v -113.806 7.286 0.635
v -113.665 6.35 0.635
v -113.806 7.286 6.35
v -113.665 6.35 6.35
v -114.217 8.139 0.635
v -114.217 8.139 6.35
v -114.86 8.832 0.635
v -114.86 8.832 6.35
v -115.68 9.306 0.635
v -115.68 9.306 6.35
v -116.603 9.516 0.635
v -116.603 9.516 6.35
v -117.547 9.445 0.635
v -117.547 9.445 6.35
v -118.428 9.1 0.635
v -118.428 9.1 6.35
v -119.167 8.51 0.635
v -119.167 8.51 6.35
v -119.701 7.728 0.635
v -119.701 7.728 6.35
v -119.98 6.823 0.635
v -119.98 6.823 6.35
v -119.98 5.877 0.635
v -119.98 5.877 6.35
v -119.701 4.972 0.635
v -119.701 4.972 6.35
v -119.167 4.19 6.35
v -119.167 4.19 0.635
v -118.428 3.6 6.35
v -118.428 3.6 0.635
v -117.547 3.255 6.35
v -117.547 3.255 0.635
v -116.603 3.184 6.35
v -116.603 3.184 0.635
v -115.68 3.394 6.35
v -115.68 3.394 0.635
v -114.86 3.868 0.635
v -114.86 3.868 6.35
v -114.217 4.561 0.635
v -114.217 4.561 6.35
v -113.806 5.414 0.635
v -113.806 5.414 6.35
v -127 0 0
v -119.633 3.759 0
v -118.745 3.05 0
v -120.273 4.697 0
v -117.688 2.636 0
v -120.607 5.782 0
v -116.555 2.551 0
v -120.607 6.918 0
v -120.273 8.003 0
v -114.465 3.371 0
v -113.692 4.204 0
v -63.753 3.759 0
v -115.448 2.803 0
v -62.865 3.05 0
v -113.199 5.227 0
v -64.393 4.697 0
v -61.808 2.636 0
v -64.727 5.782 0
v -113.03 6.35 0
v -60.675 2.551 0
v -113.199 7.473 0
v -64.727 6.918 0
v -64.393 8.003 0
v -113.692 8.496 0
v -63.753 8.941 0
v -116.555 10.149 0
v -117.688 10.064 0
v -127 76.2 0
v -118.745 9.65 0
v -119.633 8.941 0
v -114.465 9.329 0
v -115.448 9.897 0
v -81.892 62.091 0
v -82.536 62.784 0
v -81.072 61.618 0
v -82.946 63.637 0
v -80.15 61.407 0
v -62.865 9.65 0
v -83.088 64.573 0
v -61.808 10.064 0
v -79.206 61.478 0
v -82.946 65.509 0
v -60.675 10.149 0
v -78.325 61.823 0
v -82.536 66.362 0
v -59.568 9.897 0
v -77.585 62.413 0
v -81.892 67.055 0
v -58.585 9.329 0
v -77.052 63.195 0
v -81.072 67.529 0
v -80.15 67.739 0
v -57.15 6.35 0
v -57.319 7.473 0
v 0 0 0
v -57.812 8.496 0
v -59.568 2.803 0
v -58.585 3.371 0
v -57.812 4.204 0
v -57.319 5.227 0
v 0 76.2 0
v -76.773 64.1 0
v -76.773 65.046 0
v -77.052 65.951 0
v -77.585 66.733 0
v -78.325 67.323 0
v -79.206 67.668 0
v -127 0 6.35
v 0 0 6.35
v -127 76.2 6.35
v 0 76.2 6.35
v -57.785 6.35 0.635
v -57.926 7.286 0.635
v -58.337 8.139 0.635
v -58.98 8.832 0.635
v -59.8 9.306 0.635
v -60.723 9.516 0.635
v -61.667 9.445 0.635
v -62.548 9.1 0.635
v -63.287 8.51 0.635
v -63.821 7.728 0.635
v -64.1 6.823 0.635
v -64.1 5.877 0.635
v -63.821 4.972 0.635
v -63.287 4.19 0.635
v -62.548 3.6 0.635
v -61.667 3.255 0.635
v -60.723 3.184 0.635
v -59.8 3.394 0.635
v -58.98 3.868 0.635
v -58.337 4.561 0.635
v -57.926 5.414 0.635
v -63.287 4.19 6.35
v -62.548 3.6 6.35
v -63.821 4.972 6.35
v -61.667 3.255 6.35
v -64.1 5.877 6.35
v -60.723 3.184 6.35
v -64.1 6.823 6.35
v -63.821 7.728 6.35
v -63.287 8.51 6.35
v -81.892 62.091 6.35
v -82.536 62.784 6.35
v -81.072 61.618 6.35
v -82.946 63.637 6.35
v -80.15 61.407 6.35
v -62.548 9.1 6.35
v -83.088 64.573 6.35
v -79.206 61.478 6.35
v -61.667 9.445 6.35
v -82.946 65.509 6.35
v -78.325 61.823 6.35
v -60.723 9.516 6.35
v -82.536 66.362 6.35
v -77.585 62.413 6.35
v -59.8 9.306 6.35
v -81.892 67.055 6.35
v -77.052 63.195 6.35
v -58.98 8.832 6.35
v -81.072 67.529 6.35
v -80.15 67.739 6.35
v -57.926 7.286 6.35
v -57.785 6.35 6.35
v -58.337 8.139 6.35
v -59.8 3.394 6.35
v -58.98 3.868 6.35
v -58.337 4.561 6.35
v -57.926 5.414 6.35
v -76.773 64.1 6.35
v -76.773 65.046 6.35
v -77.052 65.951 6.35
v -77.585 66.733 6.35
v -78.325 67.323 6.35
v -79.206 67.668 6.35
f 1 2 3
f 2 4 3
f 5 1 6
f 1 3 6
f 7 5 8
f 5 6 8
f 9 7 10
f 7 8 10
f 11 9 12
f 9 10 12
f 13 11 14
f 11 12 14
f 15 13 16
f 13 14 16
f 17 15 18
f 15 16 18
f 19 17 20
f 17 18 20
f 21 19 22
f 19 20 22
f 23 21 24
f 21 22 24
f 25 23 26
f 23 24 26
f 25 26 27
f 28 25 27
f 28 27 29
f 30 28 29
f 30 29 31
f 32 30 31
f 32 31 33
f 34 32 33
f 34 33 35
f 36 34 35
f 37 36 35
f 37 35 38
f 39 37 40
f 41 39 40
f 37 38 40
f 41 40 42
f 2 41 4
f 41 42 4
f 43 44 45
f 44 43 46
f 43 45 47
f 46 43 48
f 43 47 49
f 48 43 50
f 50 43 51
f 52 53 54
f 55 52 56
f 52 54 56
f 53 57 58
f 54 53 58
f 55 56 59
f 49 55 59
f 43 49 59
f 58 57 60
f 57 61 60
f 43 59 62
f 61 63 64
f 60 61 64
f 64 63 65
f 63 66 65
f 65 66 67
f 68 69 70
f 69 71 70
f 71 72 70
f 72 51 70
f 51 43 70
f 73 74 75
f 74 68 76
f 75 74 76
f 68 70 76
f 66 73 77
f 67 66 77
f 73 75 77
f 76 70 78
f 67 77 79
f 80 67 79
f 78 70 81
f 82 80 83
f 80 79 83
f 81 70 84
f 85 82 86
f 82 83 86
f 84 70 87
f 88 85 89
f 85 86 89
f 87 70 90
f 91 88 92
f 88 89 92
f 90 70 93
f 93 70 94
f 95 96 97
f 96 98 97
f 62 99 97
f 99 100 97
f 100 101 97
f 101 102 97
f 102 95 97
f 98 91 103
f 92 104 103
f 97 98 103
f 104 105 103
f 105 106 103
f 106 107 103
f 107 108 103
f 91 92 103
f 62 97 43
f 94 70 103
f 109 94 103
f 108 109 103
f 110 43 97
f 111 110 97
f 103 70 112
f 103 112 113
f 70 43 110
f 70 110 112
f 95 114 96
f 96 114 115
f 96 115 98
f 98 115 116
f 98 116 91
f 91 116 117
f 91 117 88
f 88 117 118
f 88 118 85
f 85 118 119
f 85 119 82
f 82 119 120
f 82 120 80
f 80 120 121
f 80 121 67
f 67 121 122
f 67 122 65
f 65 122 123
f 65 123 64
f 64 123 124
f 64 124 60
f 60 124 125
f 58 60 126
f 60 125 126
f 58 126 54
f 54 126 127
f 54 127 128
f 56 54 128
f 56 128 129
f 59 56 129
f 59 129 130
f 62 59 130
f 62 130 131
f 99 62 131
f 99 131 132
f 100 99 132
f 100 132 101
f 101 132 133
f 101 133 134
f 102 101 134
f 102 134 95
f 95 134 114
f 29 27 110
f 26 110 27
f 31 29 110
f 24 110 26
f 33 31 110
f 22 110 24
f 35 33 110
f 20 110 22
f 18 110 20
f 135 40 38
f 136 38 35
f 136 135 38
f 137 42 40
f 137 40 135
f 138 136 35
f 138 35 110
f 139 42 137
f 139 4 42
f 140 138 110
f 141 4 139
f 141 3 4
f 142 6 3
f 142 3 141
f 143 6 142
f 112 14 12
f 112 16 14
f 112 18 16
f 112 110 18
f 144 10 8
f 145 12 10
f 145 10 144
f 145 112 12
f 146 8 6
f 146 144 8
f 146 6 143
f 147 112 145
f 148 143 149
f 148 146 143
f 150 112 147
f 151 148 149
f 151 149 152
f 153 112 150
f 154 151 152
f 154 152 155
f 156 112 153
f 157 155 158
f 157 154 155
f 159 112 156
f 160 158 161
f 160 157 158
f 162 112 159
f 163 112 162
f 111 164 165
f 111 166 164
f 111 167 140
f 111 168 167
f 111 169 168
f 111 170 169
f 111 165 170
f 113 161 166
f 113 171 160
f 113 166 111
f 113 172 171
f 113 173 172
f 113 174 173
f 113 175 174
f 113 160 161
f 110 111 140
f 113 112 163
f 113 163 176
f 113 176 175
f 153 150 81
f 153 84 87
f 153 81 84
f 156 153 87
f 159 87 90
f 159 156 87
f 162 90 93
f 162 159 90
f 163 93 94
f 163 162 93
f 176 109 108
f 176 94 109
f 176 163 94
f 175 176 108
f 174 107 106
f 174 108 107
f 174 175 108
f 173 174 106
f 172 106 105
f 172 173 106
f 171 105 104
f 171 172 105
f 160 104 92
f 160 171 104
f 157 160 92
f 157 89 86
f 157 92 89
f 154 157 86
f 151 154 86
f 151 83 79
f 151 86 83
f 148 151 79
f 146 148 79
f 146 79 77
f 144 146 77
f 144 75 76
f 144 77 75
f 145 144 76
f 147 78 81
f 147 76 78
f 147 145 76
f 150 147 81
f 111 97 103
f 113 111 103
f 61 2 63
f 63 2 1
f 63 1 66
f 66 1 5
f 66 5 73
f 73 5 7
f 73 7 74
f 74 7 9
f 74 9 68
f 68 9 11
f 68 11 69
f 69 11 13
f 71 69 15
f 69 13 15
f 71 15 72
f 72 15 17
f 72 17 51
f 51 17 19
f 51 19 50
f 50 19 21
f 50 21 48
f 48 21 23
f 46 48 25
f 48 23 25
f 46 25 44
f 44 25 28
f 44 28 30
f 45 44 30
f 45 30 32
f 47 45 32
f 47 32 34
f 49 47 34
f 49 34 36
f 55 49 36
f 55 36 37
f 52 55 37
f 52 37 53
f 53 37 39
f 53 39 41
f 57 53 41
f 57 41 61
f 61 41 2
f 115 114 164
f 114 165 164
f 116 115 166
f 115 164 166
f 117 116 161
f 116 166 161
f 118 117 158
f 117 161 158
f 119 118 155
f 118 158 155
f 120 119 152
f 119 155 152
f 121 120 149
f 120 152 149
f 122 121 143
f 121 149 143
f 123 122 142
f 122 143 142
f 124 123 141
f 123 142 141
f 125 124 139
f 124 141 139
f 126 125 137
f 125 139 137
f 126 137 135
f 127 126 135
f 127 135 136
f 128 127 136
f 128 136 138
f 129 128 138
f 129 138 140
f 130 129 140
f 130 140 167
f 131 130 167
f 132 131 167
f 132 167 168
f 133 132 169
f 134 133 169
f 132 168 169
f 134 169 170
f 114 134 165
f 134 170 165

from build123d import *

# Parameters (mm, degrees)
SKETCH1_W                             = 127
SKETCH1_H                             = 76.2
BOSS_EXTRUDE1_DEPTH                   = 6.35
CUT_EXTRUDE1_DEPTH                    = 149.24224263
CUT_EXTRUDE1_DEPTH_BACK               = 149.24224263
SKETCH4_R                             = 3.175
F_1_4_0_25_DIAMETER_HOLE1_D           = 6.35
F_1_4_0_25_DIAMETER_HOLE1_CSINK_D     = 7.62
F_1_4_0_25_DIAMETER_HOLE1_CSINK_ANGLE = 90


with BuildPart() as part:
    # Sketch1 → Boss-Extrude1 (new body)
    with BuildSketch(Plane.XY):
        with Locations((-63.5, 38.1)):
            Rectangle(SKETCH1_W, SKETCH1_H)
    extrude(amount=BOSS_EXTRUDE1_DEPTH)

    # Sketch4 → Cut-Extrude1 (cut, two sides: drawn at the far end of the back side and taken through both)
    with BuildSketch(Plane(origin=(0, 0, 0), x_dir=(-1, 0, 0), z_dir=(0, 0, -1)).offset(-CUT_EXTRUDE1_DEPTH_BACK)):
        with Locations((79.912500047, 64.573038165)):
            Circle(SKETCH4_R)
    extrude(amount=CUT_EXTRUDE1_DEPTH + CUT_EXTRUDE1_DEPTH_BACK, mode=Mode.SUBTRACT)

    # 1/4 (0.25) Diameter Hole1 (through all)
    with Locations(Plane(origin=(0, 0, 0), x_dir=(-1, 0, 0), z_dir=(0, 0, -1))):
        with Locations((116.84, 6.35), (60.96, 6.35)):
            CounterSinkHole(F_1_4_0_25_DIAMETER_HOLE1_D / 2, F_1_4_0_25_DIAMETER_HOLE1_CSINK_D / 2, counter_sink_angle=F_1_4_0_25_DIAMETER_HOLE1_CSINK_ANGLE)


solid = part.part
